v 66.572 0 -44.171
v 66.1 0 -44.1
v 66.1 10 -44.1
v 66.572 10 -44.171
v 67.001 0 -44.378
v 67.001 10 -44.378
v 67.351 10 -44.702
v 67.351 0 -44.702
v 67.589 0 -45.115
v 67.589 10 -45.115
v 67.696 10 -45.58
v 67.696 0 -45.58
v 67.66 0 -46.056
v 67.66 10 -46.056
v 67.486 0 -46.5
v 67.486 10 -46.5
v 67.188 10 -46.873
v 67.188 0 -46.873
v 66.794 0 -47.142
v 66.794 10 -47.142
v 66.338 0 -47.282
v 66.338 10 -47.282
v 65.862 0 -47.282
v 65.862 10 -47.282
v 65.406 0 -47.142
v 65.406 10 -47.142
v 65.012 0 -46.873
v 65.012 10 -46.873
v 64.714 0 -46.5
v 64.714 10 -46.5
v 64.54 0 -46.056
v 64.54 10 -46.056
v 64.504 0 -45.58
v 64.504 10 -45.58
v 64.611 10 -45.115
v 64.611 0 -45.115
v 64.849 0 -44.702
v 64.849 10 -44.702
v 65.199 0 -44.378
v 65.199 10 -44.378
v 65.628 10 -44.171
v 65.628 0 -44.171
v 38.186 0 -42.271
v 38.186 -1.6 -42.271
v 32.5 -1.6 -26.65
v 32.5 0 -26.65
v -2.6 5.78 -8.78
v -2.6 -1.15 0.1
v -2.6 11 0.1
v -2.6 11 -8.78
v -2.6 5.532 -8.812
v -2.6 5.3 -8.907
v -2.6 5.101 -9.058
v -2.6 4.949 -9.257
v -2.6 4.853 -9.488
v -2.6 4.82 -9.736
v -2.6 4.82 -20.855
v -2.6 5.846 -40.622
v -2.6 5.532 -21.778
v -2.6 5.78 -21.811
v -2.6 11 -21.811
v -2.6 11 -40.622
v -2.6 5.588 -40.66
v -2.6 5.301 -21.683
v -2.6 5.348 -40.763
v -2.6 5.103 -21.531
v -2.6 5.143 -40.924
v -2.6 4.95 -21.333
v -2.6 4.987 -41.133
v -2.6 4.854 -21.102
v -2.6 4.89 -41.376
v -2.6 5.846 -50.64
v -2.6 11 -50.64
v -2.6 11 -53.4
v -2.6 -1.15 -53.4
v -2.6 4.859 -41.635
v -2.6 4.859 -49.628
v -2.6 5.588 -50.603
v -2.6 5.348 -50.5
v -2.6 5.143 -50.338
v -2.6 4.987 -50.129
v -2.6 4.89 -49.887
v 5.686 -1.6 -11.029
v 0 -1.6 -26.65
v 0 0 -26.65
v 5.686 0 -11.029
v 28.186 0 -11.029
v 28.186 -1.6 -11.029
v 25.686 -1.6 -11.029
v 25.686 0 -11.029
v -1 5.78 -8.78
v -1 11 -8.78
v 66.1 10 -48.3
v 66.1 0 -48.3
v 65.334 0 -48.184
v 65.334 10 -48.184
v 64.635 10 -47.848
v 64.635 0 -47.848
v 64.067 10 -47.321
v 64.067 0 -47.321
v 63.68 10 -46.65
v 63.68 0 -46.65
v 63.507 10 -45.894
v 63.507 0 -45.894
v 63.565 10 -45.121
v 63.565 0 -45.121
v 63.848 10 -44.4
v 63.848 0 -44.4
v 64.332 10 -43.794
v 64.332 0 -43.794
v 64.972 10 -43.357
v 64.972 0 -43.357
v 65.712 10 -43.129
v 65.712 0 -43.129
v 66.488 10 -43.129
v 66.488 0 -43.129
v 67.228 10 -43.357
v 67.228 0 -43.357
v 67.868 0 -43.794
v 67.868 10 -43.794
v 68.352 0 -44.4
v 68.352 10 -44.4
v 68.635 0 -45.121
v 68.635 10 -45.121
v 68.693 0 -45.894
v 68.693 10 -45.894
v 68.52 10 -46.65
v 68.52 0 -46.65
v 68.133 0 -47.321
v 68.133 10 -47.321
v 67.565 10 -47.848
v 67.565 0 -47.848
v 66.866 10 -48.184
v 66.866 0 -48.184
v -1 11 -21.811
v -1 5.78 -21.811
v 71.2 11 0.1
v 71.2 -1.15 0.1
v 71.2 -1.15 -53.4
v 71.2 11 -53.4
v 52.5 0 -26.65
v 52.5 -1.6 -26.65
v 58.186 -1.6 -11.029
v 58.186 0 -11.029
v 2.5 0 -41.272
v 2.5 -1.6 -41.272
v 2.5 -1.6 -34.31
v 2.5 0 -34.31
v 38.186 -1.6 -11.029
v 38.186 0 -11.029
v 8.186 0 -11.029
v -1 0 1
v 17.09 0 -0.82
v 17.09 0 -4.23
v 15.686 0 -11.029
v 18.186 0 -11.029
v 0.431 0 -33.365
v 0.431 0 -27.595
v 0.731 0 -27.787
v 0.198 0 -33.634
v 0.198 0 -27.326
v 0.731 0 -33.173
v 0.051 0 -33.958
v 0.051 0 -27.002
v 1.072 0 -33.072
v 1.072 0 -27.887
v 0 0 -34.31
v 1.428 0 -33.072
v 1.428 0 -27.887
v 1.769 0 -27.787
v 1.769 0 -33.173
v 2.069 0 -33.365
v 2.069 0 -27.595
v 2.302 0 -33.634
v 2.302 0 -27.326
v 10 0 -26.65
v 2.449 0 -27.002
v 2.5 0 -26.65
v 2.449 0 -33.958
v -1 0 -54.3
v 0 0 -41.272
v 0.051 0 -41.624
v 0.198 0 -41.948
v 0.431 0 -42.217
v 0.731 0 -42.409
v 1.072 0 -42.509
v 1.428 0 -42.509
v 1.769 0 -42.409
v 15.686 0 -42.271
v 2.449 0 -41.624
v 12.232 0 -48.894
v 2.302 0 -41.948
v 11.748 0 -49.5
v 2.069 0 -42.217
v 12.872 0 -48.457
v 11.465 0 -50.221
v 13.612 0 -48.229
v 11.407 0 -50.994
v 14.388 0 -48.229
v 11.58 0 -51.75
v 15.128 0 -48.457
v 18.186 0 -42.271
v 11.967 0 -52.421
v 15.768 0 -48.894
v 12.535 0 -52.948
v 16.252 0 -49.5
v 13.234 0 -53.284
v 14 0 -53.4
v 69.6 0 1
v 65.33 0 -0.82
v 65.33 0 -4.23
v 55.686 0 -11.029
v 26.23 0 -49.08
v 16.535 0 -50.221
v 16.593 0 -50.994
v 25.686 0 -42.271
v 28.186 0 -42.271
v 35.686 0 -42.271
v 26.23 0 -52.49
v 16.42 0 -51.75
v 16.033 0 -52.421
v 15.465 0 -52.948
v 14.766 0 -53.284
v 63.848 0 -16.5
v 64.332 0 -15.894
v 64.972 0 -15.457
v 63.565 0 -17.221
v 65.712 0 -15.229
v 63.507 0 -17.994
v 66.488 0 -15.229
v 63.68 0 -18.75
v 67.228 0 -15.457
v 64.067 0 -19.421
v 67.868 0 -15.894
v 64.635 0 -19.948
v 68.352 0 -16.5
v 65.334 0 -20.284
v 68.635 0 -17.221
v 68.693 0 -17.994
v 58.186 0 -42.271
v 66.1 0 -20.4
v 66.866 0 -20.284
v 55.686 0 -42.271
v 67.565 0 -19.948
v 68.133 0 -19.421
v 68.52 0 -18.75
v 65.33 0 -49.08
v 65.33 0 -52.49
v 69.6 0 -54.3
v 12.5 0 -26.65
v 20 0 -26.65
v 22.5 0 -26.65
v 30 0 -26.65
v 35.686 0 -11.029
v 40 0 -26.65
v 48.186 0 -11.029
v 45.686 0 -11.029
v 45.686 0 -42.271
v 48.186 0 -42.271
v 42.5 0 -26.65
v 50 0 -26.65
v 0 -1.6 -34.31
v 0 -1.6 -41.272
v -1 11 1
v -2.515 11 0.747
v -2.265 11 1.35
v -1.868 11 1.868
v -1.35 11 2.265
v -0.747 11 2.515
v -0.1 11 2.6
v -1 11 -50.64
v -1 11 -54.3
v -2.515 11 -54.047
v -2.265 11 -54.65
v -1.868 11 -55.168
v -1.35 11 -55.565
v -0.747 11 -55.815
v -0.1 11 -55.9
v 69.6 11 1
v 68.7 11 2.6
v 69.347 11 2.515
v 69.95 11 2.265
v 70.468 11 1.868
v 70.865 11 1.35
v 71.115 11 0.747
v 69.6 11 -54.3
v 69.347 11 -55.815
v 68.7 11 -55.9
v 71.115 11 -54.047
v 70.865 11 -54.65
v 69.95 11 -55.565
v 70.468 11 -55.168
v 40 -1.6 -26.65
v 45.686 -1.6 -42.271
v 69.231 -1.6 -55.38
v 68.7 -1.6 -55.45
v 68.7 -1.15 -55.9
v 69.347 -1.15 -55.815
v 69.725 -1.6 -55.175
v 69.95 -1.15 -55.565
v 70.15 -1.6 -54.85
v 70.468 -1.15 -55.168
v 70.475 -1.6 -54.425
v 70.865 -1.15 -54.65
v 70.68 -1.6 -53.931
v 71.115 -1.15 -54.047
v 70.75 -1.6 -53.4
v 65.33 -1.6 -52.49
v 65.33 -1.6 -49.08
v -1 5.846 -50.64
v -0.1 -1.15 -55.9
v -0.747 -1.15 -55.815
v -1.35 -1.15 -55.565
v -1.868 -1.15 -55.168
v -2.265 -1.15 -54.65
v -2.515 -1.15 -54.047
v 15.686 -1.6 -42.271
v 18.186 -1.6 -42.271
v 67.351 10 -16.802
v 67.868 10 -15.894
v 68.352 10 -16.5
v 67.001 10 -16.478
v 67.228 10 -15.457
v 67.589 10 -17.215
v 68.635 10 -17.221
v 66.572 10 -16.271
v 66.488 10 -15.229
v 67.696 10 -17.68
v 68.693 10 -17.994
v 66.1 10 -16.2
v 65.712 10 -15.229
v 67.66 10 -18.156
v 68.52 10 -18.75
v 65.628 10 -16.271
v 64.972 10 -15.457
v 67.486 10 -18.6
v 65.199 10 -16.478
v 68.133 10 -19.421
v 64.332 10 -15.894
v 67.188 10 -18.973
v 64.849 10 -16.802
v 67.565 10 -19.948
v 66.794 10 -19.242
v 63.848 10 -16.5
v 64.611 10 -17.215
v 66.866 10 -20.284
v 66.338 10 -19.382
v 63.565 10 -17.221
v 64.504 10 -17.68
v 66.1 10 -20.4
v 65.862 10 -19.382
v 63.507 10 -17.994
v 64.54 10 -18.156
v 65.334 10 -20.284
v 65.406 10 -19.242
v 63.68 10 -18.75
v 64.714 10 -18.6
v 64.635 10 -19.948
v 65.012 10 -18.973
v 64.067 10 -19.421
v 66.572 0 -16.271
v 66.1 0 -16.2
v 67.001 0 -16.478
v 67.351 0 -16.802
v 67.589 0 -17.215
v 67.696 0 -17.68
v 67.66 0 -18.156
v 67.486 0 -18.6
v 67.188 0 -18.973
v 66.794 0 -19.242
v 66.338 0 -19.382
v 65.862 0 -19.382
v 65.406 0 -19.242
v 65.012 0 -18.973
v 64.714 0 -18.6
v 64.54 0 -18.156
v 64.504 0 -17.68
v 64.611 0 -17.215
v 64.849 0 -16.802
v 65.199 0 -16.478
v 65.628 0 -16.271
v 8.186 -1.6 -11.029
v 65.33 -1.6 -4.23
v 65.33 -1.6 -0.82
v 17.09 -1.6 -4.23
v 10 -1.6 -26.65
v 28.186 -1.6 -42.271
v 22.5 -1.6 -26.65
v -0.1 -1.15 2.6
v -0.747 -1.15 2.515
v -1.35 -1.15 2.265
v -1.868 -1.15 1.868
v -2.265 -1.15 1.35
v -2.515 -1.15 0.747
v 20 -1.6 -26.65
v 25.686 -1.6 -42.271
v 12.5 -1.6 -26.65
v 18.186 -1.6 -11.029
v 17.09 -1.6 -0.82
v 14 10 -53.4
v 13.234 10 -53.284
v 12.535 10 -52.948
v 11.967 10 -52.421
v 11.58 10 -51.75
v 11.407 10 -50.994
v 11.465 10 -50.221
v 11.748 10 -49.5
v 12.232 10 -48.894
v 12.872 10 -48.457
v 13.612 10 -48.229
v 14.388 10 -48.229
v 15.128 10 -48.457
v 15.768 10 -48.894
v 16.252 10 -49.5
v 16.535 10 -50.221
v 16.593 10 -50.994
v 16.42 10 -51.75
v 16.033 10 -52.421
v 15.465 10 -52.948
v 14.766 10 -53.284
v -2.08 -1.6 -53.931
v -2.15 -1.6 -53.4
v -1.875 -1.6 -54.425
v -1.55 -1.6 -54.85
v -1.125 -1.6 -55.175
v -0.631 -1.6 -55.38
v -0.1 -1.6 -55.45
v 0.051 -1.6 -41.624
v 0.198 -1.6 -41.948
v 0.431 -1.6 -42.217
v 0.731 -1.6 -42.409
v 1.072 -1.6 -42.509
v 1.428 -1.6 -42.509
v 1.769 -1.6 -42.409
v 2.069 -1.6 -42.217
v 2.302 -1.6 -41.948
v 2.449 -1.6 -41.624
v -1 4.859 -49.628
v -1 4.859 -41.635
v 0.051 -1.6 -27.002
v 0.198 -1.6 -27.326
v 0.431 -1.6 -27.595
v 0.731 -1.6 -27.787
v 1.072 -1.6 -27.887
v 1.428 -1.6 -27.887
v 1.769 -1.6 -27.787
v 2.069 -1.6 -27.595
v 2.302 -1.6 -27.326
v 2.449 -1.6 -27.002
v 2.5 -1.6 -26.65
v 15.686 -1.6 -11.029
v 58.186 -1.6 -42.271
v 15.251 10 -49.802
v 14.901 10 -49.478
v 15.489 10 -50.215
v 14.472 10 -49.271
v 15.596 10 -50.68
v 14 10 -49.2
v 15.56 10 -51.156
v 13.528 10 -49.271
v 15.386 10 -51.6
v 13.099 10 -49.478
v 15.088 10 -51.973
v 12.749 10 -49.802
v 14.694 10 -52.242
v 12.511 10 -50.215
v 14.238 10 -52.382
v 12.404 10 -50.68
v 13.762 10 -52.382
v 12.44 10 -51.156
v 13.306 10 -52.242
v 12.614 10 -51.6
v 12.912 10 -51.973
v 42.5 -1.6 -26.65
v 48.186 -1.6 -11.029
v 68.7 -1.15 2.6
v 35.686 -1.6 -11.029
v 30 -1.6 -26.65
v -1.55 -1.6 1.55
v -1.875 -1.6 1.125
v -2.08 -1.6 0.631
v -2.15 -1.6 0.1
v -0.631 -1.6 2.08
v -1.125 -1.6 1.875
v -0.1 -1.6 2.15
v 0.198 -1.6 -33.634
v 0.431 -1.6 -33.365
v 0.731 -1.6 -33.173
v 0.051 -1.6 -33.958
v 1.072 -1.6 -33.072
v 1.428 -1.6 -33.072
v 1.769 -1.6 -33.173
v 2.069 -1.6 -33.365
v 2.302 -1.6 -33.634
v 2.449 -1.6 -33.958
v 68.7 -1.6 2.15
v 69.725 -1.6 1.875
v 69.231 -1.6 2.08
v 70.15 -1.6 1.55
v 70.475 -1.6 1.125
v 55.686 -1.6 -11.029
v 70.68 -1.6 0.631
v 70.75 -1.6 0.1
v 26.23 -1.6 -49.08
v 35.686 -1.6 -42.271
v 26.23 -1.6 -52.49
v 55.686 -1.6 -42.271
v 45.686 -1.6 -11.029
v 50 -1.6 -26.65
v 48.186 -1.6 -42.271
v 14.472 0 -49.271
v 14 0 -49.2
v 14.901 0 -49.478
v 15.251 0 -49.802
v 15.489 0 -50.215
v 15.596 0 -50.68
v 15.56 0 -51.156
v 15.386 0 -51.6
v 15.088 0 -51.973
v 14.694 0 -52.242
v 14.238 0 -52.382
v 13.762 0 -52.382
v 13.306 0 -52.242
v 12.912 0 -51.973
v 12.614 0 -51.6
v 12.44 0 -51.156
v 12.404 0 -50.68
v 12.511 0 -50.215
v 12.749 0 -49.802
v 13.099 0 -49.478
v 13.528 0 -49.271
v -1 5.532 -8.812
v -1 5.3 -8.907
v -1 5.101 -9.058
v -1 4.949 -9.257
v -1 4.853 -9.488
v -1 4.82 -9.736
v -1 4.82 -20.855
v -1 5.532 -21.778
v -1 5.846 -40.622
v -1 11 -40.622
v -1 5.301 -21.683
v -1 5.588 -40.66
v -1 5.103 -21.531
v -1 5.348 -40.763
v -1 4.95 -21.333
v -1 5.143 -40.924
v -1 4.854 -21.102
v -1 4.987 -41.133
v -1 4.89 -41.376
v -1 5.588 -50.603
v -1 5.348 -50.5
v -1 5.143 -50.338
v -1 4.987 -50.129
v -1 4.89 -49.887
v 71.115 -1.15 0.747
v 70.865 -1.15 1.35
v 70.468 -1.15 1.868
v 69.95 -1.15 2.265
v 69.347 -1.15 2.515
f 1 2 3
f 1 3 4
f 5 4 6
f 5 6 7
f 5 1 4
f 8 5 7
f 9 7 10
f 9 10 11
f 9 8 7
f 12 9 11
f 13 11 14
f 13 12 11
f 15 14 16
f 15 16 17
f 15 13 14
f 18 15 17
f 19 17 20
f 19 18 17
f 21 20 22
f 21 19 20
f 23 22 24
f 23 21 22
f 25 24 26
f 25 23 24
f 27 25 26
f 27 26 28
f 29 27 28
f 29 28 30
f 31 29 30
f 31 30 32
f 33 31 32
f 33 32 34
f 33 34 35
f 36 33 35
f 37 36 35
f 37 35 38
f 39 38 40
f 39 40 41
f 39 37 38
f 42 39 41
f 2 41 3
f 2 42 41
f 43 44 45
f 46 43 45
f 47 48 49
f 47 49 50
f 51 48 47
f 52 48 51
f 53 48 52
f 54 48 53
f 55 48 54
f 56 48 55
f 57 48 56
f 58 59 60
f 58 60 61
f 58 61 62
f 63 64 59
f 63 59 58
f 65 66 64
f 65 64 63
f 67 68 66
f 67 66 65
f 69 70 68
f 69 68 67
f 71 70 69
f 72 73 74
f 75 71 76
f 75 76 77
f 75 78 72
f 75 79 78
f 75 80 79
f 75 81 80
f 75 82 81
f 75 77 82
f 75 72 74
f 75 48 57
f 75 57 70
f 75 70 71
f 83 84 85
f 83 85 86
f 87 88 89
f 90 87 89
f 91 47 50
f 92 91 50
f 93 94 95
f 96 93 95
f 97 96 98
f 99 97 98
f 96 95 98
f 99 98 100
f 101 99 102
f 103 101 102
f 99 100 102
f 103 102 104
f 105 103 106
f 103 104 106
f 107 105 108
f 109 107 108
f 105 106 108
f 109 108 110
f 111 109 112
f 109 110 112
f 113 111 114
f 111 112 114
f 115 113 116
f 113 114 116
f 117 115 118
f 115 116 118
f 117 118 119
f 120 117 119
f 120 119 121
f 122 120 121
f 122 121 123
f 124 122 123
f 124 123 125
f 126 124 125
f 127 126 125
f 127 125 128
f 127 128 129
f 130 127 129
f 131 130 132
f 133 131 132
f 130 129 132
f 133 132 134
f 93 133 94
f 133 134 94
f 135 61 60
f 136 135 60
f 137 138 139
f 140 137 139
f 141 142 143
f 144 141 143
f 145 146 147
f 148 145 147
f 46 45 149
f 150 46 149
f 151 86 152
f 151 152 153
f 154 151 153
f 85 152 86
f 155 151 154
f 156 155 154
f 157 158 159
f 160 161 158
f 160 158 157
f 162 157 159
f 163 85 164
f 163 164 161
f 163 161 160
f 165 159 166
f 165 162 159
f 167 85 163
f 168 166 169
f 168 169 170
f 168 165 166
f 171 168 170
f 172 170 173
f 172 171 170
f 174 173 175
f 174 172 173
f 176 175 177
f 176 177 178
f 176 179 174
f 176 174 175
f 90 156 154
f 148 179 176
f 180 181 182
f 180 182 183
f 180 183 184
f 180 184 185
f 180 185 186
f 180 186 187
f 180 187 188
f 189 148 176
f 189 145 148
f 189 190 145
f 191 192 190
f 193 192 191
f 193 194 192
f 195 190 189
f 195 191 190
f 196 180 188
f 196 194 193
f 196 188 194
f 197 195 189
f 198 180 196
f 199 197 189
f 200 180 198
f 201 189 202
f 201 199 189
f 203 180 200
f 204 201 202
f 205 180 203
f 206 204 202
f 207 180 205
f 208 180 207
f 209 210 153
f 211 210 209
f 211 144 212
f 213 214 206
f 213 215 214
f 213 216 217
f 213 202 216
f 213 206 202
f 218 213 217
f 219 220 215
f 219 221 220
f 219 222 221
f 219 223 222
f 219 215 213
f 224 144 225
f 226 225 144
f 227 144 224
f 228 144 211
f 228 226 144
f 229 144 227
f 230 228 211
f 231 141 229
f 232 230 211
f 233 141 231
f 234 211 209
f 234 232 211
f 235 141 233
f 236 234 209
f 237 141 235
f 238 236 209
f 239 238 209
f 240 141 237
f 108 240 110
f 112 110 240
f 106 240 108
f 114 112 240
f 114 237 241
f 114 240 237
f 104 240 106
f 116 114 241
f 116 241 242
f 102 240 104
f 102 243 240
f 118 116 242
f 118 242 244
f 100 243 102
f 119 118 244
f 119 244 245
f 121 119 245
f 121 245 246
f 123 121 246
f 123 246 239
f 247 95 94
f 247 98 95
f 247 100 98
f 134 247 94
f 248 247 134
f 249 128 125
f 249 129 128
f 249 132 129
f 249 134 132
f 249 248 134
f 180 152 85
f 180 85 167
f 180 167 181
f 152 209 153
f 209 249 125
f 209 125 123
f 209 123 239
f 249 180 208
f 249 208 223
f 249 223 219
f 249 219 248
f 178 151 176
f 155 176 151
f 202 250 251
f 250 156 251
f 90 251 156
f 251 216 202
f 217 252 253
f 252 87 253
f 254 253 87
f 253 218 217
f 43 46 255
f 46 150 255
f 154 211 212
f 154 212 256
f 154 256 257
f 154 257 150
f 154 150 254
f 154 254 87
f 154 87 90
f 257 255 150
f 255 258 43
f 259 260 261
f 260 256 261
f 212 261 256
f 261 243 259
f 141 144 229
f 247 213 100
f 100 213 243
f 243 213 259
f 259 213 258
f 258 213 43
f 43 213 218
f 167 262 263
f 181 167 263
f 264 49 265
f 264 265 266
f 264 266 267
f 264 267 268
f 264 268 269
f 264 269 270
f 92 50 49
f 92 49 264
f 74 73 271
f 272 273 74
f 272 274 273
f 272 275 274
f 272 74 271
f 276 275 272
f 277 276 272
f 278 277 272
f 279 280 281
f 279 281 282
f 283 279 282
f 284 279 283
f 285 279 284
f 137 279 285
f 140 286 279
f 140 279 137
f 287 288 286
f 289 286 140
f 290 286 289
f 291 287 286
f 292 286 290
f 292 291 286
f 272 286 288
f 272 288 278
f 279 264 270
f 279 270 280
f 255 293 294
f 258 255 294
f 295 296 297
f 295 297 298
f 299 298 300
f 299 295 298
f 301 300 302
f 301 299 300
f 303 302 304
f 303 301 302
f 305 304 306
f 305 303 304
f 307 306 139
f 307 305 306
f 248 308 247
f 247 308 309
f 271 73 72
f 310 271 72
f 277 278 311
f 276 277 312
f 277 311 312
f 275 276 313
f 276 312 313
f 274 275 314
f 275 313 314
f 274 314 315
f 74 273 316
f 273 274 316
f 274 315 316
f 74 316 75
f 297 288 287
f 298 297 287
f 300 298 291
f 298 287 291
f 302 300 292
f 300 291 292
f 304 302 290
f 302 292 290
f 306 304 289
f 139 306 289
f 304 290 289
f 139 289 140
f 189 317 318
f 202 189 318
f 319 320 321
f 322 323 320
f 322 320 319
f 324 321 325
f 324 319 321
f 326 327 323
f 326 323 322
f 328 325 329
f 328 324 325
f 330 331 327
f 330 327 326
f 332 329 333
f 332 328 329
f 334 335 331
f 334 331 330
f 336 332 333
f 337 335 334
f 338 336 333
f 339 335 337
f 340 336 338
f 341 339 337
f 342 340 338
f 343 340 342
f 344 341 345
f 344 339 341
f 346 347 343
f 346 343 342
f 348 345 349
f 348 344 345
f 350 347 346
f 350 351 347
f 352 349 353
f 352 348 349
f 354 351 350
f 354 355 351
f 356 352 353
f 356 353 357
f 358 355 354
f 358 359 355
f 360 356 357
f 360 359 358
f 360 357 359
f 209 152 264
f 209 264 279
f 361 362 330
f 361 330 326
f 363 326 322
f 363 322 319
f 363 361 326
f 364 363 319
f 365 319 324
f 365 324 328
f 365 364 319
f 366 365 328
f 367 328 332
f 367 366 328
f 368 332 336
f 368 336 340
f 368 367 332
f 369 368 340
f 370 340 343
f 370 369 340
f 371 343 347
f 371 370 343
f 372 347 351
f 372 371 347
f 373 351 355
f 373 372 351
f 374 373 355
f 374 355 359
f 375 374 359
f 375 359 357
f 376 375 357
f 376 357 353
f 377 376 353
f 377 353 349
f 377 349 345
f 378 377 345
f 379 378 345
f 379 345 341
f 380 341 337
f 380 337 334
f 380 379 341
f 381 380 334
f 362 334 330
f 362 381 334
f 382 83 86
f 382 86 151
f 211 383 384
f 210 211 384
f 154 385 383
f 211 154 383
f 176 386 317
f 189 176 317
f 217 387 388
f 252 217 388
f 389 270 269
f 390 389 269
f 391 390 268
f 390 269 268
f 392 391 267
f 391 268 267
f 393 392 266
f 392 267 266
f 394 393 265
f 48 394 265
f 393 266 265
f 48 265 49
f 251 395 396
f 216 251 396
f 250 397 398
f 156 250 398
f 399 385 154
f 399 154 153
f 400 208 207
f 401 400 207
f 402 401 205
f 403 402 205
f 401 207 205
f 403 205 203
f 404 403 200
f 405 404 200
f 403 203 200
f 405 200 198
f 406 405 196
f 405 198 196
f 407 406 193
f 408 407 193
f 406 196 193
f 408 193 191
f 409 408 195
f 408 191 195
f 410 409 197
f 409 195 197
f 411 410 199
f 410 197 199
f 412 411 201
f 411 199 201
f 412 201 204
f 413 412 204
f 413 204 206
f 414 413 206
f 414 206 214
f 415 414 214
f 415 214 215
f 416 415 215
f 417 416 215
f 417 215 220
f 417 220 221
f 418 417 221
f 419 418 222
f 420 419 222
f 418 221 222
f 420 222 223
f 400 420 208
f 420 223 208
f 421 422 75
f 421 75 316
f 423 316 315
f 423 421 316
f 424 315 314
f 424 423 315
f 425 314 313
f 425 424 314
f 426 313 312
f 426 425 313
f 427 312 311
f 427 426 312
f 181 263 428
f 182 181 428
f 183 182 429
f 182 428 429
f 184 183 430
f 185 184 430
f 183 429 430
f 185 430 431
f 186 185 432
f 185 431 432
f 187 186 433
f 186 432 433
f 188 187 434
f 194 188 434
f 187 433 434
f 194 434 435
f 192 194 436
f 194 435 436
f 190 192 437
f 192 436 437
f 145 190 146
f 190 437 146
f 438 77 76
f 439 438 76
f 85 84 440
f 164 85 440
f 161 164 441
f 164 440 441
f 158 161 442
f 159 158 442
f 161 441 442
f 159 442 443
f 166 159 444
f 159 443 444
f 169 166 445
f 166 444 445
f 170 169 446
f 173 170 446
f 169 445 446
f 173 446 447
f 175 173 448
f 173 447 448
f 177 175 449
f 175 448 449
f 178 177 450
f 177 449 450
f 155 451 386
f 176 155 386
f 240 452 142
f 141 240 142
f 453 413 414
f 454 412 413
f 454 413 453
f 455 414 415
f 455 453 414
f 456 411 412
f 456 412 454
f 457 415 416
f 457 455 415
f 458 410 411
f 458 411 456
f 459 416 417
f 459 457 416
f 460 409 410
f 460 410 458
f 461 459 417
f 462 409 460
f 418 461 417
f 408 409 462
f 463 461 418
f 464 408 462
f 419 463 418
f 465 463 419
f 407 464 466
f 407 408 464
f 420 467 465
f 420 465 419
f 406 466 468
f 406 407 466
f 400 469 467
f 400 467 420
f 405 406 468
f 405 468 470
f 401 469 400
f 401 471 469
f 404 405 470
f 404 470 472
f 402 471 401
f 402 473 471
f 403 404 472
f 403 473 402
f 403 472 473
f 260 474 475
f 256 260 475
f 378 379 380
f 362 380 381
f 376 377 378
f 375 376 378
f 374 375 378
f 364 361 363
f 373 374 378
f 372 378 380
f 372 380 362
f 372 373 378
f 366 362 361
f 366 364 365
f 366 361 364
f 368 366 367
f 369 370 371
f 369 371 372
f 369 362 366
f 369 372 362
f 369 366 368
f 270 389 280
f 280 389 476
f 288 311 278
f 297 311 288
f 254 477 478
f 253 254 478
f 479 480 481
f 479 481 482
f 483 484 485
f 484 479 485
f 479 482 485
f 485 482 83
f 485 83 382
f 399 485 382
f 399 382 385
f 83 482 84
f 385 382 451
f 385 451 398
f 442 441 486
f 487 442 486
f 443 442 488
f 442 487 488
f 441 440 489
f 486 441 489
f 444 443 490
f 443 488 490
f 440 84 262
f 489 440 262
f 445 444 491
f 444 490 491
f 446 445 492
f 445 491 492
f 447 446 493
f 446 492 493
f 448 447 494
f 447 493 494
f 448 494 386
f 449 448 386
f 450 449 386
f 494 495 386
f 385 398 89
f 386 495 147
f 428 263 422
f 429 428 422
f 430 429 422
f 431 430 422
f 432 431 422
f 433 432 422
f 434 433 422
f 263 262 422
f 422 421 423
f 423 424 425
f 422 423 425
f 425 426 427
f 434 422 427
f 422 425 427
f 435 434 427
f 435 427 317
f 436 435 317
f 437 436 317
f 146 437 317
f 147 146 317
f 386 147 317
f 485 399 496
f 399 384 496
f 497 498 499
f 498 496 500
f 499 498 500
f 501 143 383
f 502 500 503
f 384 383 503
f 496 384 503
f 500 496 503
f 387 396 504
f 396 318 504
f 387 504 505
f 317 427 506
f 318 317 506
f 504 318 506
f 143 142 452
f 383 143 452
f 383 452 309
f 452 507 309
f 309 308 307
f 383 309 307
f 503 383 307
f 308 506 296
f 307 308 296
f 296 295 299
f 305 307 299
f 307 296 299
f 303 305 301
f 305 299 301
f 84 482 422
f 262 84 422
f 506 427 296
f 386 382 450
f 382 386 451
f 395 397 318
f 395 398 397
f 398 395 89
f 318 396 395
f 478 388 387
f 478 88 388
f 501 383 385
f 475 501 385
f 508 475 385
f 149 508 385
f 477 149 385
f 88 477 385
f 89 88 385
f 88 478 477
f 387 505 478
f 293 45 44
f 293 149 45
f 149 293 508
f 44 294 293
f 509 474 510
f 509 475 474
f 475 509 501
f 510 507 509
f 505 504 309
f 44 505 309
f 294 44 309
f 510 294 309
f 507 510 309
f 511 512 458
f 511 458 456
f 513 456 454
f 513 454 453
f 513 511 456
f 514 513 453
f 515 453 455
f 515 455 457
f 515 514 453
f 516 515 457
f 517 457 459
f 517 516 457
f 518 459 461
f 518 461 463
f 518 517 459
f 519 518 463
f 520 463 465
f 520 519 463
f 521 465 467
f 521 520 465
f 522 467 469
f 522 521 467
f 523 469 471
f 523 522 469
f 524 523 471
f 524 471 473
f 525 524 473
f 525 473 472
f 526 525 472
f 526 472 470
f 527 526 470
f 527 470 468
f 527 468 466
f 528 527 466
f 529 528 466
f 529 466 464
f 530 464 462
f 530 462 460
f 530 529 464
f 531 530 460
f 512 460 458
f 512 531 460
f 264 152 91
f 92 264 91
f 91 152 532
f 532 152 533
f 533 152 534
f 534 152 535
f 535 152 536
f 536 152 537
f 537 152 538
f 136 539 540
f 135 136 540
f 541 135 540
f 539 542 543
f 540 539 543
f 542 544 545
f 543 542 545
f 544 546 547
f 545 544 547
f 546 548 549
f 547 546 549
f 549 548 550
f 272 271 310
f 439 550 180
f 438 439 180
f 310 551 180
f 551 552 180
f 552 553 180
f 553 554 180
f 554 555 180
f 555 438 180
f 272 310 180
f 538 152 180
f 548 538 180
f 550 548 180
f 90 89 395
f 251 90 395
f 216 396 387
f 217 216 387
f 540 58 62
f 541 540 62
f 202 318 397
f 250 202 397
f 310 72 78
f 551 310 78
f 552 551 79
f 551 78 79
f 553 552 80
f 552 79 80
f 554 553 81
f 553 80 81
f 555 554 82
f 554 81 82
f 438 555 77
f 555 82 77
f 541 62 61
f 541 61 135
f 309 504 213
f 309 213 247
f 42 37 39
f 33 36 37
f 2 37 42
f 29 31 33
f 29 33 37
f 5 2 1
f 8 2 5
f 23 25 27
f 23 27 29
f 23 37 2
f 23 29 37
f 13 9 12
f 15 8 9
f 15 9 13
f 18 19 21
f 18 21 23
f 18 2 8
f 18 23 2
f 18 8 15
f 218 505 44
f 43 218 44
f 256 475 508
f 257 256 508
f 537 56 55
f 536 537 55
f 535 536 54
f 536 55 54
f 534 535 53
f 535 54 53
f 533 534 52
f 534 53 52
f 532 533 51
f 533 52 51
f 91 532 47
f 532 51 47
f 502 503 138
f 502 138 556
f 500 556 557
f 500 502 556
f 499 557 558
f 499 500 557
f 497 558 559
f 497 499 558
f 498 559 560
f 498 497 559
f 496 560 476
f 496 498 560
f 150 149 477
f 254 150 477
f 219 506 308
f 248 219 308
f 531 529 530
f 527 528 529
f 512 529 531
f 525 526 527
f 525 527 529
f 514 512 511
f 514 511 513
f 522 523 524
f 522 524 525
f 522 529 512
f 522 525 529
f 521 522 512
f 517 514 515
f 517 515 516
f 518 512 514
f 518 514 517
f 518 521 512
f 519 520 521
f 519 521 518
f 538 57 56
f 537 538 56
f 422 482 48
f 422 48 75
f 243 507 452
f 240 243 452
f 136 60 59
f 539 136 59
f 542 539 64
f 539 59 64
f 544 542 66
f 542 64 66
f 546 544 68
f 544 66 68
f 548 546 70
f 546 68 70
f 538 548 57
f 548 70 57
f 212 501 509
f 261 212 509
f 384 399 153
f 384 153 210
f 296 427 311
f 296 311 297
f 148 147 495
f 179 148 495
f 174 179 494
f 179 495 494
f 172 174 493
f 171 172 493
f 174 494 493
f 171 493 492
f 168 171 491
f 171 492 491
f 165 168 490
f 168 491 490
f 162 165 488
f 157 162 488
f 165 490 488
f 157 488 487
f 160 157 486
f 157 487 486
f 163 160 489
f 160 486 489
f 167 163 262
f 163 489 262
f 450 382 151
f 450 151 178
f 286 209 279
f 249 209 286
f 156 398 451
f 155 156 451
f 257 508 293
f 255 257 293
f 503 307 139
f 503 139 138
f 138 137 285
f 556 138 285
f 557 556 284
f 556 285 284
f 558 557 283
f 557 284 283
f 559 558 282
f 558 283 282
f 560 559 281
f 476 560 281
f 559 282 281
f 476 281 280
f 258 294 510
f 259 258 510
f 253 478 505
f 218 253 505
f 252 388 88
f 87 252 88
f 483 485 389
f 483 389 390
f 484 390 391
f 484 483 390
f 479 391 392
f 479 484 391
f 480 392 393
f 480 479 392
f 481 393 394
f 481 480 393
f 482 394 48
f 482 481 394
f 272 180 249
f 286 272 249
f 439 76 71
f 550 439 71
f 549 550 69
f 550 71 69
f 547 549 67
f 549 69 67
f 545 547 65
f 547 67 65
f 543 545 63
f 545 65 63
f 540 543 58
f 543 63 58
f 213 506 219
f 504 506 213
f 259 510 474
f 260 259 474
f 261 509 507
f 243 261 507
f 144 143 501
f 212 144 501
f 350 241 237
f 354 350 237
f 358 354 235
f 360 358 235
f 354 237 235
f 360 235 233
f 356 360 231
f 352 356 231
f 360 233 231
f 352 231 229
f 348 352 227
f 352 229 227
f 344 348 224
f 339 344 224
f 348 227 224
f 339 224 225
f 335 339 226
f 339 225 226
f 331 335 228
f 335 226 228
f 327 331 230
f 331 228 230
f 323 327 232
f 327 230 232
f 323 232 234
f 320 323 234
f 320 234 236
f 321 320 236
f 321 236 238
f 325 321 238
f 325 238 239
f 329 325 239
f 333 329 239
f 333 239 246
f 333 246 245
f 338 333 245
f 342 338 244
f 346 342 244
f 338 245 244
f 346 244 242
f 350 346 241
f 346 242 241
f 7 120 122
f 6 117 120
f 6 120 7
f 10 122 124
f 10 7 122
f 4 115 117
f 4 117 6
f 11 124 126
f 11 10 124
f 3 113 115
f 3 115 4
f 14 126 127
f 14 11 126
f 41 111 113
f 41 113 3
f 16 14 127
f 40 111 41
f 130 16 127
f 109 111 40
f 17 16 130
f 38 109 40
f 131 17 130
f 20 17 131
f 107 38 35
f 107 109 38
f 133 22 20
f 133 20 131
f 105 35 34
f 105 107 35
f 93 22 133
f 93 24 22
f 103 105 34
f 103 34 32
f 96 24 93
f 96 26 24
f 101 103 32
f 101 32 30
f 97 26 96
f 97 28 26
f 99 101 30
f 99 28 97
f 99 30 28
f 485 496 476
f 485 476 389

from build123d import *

# Parameters (mm, degrees)
SKETCH2_W           = 70.6
SKETCH2_H           = 55.3
BOSS_EXTRUDE1_DEPTH = 11
SHELL1_T            = 1.6
FILLET1_R           = 2.5
SKETCH2_4_R         = 2.6
SKETCH2_4_R_2       = 1.6
BOSS_EXTRUDE2_DEPTH = 10
CUT_EXTRUDE1_DEPTH  = 3
CUT_EXTRUDE2_DEPTH  = 3
SKETCH8_W           = 48.24
SKETCH8_H           = 3.41
SKETCH8_W_2         = 39.1
CUT_EXTRUDE3_DEPTH  = 1.8
CUT_EXTRUDE4_DEPTH  = 3.5
CHAMFER1_SIZE       = 0.45


with BuildPart() as part:
    # Sketch2 → Boss-Extrude1 (new body)
    with BuildSketch(Plane(origin=(0, 0, 0), x_dir=(1, 0, 0), z_dir=(0, 1, 0))):
        with Locations((34.3, 26.65)):
            Rectangle(SKETCH2_W, SKETCH2_H)
    extrude(amount=BOSS_EXTRUDE1_DEPTH)

    # Shell1
    shell1_openings = [part.faces().sort_by_distance(p)[0] for p in [
        (34.3, 11, -26.65),
    ]]
    offset(amount=SHELL1_T, openings=shell1_openings, kind=Kind.INTERSECTION)

    # Fillet1
    # the kernel refuses this fillet: 2.5 mm, written as the material it takes off along each edge
    with BuildSketch(Plane(origin=(-2.6, 17.25, 2.6), x_dir=(1, 0, 0), z_dir=(0, -1, 0)), Plane(origin=(71.2, 17.25, 2.6), x_dir=(0, 0, -1), z_dir=(0, -1, 0)), Plane(origin=(71.2, 17.25, -55.9), x_dir=(-1, 0, 0), z_dir=(0, -1, 0)), Plane(origin=(-2.6, -7.85, -55.9), x_dir=(1, 0, 0), z_dir=(0, 1, 0))) as fillet1_piece_1:
        with BuildLine():
            CenterArc((FILLET1_R, -FILLET1_R), FILLET1_R, 90, 90)
            Line((0, -FILLET1_R), (0, 0))
            Line((0, 0), (FILLET1_R, 0))
        make_face()
    extrude(amount=25.1, mode=Mode.SUBTRACT)

    # Sketch2<4> → Boss-Extrude2 (add)
    # profile 1 of 3: a face of its own
    with BuildSketch(Plane(origin=(0, 0, 0), x_dir=(1, 0, 0), z_dir=(0, 1, 0))):
        with Locations(Location((66.1, 17.8, 0), (0, 0, 90))):
            Circle(SKETCH2_4_R)
        with Locations(Location((66.1, 17.8, 0), (0, 0, 270))):
            Circle(SKETCH2_4_R_2, mode=Mode.SUBTRACT)
    # profile 2 of 3: a face of its own
    with BuildSketch(Plane(origin=(0, 0, 0), x_dir=(1, 0, 0), z_dir=(0, 1, 0))):
        with Locations(Location((14, 50.8, 0), (0, 0, 90))):
            Circle(SKETCH2_4_R)
        with Locations(Location((14, 50.8, 0), (0, 0, 270))):
            Circle(SKETCH2_4_R_2, mode=Mode.SUBTRACT)
    # profile 3 of 3: a face of its own
    with BuildSketch(Plane(origin=(0, 0, 0), x_dir=(1, 0, 0), z_dir=(0, 1, 0))):
        with Locations(Location((66.1, 45.7, 0), (0, 0, 90))):
            Circle(SKETCH2_4_R)
        with Locations(Location((66.1, 45.7, 0), (0, 0, 270))):
            Circle(SKETCH2_4_R_2, mode=Mode.SUBTRACT)
    extrude(amount=BOSS_EXTRUDE2_DEPTH)

    # Sketch4 → Cut-Extrude1 (cut)
    with BuildSketch(Plane.ZY.offset(2.6)):
        with BuildLine():
            Line((-21.810563814, 11), (-21.810563814, 5.78))
            ThreePointArc((-21.810563814, 5.78), (-21.530873699, 5.10266948), (-20.854775908, 4.820012494))
            Line((-20.854775908, 4.820012494), (-9.735787906, 4.820012494))
            ThreePointArc((-9.735787906, 4.820012494), (-9.058457386, 5.101442143), (-8.78, 5.78))
            Line((-8.78, 5.78), (-8.78, 11))
            Line((-8.78, 11), (-21.810563814, 11))
        make_face()
    extrude(amount=-CUT_EXTRUDE1_DEPTH, mode=Mode.SUBTRACT)

    # Sketch6 → Cut-Extrude2 (cut)
    with BuildSketch(Plane.ZY.offset(2.6)):
        with BuildLine():
            Line((-50.64, 11), (-50.64, 5.846332149))
            ThreePointArc((-50.64, 5.846332149), (-50.33827519, 5.142948487), (-49.627556174, 4.858932788))
            Line((-49.627556174, 4.858932788), (-41.634891875, 4.858932788))
            ThreePointArc((-41.634891875, 4.858932788), (-40.924172858, 5.142948487), (-40.622448048, 5.846332149))
            Line((-40.622448048, 5.846332149), (-40.622448048, 11))
            Line((-40.622448048, 11), (-50.64, 11))
        make_face()
    extrude(amount=-CUT_EXTRUDE2_DEPTH, mode=Mode.SUBTRACT)

    # Sketch8 → Cut-Extrude3 (cut)
    with BuildSketch(Plane.XZ.offset(1.6)):
        with Locations((41.21, -2.525)):
            Rectangle(SKETCH8_W, SKETCH8_H)
        with Locations((45.78, -50.785)):
            Rectangle(SKETCH8_W_2, SKETCH8_H)
    extrude(amount=-CUT_EXTRUDE3_DEPTH, mode=Mode.SUBTRACT)

    # Sketch10 → Cut-Extrude4 (cut)
    with BuildSketch(Plane(origin=(0, -1.6, 0), x_dir=(-1, 0, 0), z_dir=(0, -1, 0))):
        Polygon((-2.5, 26.65), (0, 26.65), (-5.685748819, 11.028533507), (-8.185748819, 11.028533507), align=None)
        with BuildLine():
            Line((-2.5, 26.65), (0, 26.65))
            ThreePointArc((0, 26.65), (-1.25, 27.9), (-2.5, 26.65))
        make_face()
        with BuildLine():
            Line((-2.5, 41.272108294), (-2.5, 34.309766621))
            ThreePointArc((-2.5, 34.309766621), (-1.25, 33.059766621), (0, 34.309766621))
            Line((0, 34.309766621), (0, 41.272108294))
            ThreePointArc((0, 41.272108294), (-1.25, 42.522108294), (-2.5, 41.272108294))
        make_face()
        Polygon((-15.685748819, 11.028533507), (-10, 26.65), (-12.5, 26.65), (-18.185748819, 11.028533507), align=None)
        Polygon((-12.5, 26.65), (-10, 26.65), (-15.685748819, 42.271466493), (-18.185748819, 42.271466493), align=None)
        Polygon((-25.685748819, 11.028533507), (-20, 26.65), (-22.5, 26.65), (-28.185748819, 11.028533507), align=None)
        Polygon((-22.5, 26.65), (-20, 26.65), (-25.685748819, 42.271466493), (-28.185748819, 42.271466493), align=None)
        Polygon((-35.685748819, 11.028533507), (-30, 26.65), (-32.5, 26.65), (-38.185748819, 11.028533507), align=None)
        Polygon((-32.5, 26.65), (-30, 26.65), (-35.685748819, 42.271466493), (-38.185748819, 42.271466493), align=None)
        Polygon((-45.685748819, 11.028533507), (-40, 26.65), (-42.5, 26.65), (-48.185748819, 11.028533507), align=None)
        Polygon((-42.5, 26.65), (-40, 26.65), (-45.685748819, 42.271466493), (-48.185748819, 42.271466493), align=None)
        Polygon((-55.685748819, 11.028533507), (-50, 26.65), (-52.5, 26.65), (-58.185748819, 11.028533507), align=None)
        Polygon((-52.5, 26.65), (-50, 26.65), (-55.685748819, 42.271466493), (-58.185748819, 42.271466493), align=None)
    extrude(amount=-CUT_EXTRUDE4_DEPTH, mode=Mode.SUBTRACT)

    # Chamfer1
    chamfer1_edges = [part.edges().sort_by_distance(p)[0] for p in [
        (-2.6, -1.6, -26.65),
        (34.3, -1.6, -55.9),
        (71.2, -1.6, -26.65),
        (34.3, -1.6, 2.6),
        (70.467766953, -1.6, 1.867766953),
        (70.467766953, -1.6, -55.167766953),
        (-1.867766953, -1.6, 1.867766953),
        (-1.867766953, -1.6, -55.167766953),
    ]]
    chamfer(chamfer1_edges, length=CHAMFER1_SIZE)


solid = part.part
